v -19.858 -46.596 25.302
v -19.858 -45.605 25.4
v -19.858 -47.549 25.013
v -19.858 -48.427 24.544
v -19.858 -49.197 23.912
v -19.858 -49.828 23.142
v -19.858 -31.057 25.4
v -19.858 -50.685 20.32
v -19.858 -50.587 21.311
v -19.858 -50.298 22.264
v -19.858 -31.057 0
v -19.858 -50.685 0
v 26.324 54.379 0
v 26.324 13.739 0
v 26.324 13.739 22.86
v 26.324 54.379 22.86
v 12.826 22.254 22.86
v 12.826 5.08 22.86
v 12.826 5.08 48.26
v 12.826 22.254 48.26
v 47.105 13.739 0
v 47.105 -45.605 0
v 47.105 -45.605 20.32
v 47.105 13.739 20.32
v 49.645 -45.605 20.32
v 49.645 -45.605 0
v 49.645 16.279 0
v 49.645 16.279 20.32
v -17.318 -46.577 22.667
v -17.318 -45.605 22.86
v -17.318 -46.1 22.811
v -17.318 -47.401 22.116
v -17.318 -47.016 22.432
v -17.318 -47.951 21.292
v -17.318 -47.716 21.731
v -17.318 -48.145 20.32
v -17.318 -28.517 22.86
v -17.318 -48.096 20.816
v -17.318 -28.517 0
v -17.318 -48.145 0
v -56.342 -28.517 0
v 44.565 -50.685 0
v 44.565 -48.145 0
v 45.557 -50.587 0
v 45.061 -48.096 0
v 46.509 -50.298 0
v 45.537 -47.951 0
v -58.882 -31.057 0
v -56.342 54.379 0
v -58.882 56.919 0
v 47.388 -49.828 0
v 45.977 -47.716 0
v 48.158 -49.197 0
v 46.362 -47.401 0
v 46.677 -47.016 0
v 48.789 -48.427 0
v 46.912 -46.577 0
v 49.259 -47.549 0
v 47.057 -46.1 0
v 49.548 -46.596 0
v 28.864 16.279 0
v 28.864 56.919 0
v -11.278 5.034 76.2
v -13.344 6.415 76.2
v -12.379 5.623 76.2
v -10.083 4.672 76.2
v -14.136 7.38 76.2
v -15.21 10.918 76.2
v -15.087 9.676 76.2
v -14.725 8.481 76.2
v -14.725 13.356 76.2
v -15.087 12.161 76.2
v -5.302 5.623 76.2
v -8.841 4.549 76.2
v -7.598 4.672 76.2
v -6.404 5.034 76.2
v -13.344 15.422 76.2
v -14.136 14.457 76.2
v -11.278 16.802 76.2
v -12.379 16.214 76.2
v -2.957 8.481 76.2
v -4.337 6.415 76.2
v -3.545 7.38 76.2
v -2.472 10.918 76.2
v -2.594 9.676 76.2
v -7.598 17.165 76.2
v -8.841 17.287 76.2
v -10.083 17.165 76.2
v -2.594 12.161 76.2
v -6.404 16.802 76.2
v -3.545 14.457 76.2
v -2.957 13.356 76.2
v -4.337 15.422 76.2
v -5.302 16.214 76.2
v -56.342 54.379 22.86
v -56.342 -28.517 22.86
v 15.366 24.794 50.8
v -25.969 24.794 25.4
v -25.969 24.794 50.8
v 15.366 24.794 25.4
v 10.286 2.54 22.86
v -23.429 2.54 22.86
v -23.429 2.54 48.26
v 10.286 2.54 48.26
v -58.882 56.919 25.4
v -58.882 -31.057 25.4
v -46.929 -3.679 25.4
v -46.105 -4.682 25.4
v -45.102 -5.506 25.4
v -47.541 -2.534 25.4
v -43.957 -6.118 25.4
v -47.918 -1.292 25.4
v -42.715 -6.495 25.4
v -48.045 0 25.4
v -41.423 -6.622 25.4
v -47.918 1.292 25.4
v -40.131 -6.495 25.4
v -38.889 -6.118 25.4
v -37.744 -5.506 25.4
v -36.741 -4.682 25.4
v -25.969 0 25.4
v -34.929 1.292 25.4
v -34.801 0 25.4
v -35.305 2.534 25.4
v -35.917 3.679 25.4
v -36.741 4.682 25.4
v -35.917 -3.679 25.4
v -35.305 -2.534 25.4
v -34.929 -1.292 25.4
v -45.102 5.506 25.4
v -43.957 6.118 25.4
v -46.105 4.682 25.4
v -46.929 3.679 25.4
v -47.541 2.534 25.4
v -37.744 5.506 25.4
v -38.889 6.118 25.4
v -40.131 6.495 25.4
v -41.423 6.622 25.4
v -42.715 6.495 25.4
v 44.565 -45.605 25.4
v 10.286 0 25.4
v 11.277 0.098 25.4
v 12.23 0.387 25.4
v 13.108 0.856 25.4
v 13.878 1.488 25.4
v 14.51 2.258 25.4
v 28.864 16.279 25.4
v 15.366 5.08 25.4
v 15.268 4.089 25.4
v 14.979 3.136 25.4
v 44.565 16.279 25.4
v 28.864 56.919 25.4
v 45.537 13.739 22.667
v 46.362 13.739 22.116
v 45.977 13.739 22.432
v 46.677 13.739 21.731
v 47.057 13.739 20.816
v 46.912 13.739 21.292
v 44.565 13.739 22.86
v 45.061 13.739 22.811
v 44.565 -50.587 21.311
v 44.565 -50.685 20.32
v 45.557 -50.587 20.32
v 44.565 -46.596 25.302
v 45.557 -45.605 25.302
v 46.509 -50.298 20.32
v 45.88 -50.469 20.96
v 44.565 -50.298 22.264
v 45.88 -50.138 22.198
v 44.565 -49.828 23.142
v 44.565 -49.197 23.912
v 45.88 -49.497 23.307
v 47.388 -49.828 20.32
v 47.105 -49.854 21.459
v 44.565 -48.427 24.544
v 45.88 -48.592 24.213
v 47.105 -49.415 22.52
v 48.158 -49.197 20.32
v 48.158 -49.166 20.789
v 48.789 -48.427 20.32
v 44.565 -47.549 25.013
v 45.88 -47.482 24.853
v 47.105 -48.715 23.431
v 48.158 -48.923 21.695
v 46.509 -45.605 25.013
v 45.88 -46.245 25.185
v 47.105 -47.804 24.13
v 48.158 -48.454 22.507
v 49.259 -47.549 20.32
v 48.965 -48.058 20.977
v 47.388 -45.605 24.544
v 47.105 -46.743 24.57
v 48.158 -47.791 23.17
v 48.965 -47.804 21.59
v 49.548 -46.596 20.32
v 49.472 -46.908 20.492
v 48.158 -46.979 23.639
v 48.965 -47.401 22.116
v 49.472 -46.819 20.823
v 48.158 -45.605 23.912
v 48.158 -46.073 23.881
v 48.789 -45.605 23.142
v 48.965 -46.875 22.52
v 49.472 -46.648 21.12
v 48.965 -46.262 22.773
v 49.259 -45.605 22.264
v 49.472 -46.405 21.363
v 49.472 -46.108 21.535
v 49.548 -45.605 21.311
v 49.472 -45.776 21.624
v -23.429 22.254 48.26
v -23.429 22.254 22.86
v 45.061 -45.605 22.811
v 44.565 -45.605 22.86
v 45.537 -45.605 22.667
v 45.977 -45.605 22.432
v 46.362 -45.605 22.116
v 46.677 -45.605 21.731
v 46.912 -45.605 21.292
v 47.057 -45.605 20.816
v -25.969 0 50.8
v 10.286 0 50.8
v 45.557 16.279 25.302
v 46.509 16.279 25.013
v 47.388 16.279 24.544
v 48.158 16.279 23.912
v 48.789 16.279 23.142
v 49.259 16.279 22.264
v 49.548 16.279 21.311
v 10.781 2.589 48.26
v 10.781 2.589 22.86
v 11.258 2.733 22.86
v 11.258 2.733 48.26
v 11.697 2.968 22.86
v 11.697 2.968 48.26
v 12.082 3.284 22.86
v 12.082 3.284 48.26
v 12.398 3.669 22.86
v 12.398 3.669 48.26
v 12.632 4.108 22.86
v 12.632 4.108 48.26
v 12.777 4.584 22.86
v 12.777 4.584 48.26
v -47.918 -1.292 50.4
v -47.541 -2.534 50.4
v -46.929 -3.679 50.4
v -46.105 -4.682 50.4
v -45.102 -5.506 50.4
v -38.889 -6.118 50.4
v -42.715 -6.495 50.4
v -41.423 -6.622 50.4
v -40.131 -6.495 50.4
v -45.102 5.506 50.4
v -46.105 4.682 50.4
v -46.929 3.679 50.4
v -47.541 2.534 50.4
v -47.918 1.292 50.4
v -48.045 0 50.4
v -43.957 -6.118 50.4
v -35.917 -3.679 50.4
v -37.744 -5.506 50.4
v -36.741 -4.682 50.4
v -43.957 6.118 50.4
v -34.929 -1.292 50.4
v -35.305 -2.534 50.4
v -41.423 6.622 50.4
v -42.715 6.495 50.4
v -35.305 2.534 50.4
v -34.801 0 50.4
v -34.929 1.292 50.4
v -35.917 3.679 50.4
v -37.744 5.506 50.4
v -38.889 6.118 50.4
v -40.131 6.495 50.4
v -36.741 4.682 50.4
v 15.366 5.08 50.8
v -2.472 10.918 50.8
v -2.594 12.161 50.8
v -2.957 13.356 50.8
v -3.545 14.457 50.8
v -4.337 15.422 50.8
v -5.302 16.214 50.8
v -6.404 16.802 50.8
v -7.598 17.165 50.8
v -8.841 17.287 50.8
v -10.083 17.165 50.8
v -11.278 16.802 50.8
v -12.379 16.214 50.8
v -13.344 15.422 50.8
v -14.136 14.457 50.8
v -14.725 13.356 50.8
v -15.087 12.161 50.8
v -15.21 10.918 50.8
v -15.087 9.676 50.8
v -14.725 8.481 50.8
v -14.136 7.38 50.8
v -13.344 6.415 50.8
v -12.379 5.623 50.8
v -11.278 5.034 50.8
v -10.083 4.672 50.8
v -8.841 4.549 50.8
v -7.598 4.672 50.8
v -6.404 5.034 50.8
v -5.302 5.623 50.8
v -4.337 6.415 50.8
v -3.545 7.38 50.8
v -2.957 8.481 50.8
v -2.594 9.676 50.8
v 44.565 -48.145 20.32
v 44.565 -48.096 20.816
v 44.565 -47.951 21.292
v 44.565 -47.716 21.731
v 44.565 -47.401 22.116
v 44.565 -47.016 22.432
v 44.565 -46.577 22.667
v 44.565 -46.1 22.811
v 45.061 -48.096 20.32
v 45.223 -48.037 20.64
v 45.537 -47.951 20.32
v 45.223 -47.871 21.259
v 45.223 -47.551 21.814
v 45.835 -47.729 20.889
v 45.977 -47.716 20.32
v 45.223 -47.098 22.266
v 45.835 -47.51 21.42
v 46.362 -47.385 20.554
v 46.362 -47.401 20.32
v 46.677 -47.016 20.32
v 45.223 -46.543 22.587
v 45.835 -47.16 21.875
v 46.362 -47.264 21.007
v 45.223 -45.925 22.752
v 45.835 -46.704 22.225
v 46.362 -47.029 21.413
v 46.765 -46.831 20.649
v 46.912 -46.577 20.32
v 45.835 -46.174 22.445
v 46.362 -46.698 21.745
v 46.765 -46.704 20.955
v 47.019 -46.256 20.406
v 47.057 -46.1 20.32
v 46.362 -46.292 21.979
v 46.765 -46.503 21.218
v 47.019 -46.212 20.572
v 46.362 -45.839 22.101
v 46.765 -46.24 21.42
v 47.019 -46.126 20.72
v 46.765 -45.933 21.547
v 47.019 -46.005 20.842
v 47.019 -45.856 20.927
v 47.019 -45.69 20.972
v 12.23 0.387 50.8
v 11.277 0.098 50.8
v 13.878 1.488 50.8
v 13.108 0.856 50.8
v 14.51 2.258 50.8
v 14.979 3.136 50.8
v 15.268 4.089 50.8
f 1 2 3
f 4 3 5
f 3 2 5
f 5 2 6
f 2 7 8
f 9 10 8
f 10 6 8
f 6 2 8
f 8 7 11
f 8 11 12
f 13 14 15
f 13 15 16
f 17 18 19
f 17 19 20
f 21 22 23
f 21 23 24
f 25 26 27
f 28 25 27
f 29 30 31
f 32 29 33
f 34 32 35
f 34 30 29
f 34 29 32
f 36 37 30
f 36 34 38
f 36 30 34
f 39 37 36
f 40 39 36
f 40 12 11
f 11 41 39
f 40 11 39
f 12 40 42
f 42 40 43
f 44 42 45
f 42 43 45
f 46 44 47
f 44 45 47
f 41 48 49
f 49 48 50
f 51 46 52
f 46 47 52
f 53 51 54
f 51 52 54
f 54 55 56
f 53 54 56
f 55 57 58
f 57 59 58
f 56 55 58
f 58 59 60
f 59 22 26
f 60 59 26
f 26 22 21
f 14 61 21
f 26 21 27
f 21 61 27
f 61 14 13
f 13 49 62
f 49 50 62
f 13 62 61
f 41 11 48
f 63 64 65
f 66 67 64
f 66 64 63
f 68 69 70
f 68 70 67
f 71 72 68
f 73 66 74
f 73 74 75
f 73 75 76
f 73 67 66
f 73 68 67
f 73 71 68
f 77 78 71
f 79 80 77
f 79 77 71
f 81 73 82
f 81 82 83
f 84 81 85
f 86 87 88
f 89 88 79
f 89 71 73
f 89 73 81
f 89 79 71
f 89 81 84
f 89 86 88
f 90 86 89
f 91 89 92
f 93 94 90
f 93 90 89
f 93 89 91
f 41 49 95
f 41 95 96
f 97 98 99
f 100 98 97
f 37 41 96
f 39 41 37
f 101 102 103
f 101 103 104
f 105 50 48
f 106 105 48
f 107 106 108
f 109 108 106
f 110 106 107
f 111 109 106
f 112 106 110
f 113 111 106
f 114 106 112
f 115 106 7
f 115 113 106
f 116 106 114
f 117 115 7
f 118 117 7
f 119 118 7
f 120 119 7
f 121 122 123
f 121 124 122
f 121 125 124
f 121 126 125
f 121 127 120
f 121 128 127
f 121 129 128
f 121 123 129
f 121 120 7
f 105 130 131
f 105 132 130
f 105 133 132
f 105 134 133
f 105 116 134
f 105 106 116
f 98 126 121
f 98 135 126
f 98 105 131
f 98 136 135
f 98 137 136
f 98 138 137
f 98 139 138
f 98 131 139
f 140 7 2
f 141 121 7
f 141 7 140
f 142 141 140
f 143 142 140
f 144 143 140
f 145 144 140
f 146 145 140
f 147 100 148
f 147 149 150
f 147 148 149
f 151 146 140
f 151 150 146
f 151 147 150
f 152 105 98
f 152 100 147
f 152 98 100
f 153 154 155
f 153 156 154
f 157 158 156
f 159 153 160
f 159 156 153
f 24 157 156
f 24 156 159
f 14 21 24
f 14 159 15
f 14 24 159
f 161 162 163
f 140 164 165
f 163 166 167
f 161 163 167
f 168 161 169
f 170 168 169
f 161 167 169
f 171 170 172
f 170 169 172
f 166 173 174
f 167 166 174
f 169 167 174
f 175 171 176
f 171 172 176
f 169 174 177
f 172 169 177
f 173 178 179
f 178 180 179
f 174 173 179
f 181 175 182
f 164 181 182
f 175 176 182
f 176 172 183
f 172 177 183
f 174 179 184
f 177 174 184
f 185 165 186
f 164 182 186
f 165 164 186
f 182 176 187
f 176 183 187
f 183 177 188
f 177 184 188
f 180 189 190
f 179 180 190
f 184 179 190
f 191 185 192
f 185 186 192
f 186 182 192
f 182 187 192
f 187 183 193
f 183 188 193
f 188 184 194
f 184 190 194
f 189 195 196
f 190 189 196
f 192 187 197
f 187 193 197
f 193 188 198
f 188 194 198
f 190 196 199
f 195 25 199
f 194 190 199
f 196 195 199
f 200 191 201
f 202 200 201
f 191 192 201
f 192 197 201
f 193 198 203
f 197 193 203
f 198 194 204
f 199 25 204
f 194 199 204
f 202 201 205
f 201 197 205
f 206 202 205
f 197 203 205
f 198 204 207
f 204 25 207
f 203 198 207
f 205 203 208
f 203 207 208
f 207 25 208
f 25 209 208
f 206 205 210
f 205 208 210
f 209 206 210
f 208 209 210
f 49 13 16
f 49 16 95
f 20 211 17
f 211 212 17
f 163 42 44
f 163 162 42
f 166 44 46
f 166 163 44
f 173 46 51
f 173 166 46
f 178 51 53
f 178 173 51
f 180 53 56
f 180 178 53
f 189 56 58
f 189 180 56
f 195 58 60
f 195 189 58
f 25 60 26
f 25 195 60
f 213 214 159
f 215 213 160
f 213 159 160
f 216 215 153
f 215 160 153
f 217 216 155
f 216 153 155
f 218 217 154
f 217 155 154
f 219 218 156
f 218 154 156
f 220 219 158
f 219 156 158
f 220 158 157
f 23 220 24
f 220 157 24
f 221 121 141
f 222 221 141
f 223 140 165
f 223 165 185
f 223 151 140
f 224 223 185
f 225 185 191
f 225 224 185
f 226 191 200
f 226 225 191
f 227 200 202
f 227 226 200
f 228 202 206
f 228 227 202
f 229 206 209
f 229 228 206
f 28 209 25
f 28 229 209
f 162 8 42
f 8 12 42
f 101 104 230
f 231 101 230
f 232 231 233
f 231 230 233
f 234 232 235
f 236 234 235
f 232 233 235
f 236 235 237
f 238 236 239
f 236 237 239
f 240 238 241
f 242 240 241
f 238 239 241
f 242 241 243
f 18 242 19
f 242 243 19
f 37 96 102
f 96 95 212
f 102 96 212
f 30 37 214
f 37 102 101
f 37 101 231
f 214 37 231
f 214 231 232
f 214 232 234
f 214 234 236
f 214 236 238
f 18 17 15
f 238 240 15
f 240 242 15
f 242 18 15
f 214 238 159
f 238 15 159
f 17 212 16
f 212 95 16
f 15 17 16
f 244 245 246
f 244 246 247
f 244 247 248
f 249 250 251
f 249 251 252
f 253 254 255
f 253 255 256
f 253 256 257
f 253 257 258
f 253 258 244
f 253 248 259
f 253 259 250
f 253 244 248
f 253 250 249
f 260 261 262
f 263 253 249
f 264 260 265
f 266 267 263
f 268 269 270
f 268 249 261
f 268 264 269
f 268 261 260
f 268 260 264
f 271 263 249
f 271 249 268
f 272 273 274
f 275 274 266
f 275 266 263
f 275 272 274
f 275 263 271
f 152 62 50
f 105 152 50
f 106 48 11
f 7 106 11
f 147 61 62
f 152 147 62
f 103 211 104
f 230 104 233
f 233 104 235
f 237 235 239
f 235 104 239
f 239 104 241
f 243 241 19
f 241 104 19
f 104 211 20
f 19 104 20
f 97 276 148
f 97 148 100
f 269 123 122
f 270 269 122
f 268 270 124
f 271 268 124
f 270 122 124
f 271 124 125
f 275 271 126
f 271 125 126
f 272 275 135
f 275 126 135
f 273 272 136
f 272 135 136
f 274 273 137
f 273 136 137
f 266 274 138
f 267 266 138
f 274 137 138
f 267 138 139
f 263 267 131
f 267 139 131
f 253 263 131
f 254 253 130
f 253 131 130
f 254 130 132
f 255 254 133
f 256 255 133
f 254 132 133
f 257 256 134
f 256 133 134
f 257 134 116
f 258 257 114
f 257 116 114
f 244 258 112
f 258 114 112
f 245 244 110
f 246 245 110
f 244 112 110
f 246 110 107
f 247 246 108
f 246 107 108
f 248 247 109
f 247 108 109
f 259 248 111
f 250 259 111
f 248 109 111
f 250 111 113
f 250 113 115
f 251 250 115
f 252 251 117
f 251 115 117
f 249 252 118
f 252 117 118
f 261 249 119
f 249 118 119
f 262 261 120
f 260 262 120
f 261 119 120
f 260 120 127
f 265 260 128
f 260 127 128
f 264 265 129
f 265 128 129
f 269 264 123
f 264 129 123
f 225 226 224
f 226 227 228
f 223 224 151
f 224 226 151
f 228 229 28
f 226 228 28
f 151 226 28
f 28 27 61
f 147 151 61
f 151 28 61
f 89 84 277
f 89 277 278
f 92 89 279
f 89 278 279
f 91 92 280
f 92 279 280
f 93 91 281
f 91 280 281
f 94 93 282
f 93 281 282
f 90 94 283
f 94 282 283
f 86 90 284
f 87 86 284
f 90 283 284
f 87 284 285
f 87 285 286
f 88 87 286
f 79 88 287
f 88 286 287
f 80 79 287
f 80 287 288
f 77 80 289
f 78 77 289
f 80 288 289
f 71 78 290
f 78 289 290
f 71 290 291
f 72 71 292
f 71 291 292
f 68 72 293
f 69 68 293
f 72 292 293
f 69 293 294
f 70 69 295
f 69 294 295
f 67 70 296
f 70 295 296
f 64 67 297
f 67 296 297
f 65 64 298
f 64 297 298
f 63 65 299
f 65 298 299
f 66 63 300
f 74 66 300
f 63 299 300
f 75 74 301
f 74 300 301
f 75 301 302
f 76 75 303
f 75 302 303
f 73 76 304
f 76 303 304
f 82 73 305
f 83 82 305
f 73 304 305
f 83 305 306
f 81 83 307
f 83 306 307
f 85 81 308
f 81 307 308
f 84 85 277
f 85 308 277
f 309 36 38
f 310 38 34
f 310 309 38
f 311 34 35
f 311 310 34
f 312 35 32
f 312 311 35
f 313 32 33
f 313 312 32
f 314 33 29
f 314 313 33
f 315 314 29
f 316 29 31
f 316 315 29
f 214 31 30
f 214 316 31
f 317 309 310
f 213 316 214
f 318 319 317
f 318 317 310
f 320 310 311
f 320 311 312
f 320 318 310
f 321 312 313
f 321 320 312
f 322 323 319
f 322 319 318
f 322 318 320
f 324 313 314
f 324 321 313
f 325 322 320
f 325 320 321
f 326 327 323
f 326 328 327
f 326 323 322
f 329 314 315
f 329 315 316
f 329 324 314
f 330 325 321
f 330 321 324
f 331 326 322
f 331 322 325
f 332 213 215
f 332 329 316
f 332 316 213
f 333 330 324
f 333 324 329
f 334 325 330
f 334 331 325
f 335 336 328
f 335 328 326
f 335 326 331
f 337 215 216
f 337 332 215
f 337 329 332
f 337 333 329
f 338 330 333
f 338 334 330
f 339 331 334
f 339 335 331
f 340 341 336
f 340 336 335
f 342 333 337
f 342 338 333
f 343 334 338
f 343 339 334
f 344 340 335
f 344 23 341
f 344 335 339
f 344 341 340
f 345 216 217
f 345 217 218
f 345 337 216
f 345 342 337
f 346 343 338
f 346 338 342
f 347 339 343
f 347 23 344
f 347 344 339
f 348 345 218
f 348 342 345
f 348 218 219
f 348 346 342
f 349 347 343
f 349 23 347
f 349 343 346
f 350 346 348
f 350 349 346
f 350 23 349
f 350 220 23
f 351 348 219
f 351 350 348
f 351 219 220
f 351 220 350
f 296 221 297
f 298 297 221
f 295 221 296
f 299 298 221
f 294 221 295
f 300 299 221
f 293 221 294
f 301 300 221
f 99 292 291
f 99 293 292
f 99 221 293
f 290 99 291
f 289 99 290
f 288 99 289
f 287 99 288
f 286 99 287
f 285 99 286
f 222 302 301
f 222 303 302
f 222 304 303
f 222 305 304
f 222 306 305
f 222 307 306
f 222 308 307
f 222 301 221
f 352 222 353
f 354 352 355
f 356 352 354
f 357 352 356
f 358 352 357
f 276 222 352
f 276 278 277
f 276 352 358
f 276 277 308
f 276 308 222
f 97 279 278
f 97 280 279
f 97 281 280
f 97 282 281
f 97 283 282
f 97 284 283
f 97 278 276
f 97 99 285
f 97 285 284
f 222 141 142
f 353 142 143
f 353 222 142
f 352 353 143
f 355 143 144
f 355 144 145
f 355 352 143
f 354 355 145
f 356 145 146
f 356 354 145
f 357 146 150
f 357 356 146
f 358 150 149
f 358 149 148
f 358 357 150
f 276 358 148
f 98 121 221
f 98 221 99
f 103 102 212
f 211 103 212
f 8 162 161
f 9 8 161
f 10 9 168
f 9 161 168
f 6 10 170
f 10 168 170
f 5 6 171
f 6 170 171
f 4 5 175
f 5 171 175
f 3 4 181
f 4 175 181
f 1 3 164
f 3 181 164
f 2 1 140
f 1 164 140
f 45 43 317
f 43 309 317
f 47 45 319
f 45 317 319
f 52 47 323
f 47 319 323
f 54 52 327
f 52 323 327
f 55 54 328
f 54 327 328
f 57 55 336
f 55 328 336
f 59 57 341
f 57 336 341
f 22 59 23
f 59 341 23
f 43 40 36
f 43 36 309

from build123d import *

# Parameters (mm, degrees)
F1_DEPTH  = 25.4
F2_R      = 5.08
F3_R      = 5.08
F4_W      = 41.3342826068
F4_H      = 24.7943252325
F5_DEPTH  = 25.4
F6_R      = 5.08
F7_T      = -2.54
F8_R      = 6.3689638983
F9_DEPTH  = 25.4
F10_R     = 6.6217822458
F11_DEPTH = 25


with BuildPart() as f1:
    # F0 (on Top) → F1 (new body)
    with BuildSketch(Plane.XY):
        Polygon((28.8636367768, 56.9190941751), (-58.8818192482, 56.9190941751), (-58.8818192482, -31.0572721064), (-19.8581814766, -31.0572721064), (-19.8581814766, -50.6845451891), (49.6454536915, -50.6845451891), (49.6454536915, 16.2790901959), (28.8636367768, 16.2790901959), align=None)
    extrude(amount=F1_DEPTH)

    # F2
    f2_edges = [f1.edges().sort_by_distance(p)[0] for p in [
        (14.893636, -50.684545, 25.4),
    ]]
    fillet(f2_edges, radius=F2_R)

    # F3
    f3_edges = [f1.edges().sort_by_distance(p)[0] for p in [
        (49.645454, -14.662727, 25.4),
    ]]
    fillet(f3_edges, radius=F3_R)

    # F4 (on face) → F5 (join)
    with BuildSketch(Plane.XY.offset(25.4)):
        with Locations((-5.3013917059, 12.3971626163)):
            Rectangle(F4_W, F4_H)
    extrude(amount=F5_DEPTH)

    # F6
    f6_edges = [f1.edges().sort_by_distance(p)[0] for p in [
        (15.36575, 0, 38.1),
    ]]
    fillet(f6_edges, radius=F6_R)

    # F7
    f7_openings = [f1.faces().sort_by_distance(p)[0] for p in [
        (-5.684641, 3.684325, 0),
    ]]
    offset(amount=F7_T, openings=f7_openings, kind=Kind.INTERSECTION)

    # F8 (on face) → F9 (join)
    with BuildSketch(Plane.XY.offset(50.8)):
        with Locations((-8.8408561423, 10.9183397144)):
            Circle(F8_R)
    extrude(amount=F9_DEPTH)

    # F10 (on face) → F11 (join)
    with BuildSketch(Plane.XY.offset(25.4)):
        with Locations((-41.423138231, 0)):
            Circle(F10_R)
    extrude(amount=F11_DEPTH)


solid = f1.part
